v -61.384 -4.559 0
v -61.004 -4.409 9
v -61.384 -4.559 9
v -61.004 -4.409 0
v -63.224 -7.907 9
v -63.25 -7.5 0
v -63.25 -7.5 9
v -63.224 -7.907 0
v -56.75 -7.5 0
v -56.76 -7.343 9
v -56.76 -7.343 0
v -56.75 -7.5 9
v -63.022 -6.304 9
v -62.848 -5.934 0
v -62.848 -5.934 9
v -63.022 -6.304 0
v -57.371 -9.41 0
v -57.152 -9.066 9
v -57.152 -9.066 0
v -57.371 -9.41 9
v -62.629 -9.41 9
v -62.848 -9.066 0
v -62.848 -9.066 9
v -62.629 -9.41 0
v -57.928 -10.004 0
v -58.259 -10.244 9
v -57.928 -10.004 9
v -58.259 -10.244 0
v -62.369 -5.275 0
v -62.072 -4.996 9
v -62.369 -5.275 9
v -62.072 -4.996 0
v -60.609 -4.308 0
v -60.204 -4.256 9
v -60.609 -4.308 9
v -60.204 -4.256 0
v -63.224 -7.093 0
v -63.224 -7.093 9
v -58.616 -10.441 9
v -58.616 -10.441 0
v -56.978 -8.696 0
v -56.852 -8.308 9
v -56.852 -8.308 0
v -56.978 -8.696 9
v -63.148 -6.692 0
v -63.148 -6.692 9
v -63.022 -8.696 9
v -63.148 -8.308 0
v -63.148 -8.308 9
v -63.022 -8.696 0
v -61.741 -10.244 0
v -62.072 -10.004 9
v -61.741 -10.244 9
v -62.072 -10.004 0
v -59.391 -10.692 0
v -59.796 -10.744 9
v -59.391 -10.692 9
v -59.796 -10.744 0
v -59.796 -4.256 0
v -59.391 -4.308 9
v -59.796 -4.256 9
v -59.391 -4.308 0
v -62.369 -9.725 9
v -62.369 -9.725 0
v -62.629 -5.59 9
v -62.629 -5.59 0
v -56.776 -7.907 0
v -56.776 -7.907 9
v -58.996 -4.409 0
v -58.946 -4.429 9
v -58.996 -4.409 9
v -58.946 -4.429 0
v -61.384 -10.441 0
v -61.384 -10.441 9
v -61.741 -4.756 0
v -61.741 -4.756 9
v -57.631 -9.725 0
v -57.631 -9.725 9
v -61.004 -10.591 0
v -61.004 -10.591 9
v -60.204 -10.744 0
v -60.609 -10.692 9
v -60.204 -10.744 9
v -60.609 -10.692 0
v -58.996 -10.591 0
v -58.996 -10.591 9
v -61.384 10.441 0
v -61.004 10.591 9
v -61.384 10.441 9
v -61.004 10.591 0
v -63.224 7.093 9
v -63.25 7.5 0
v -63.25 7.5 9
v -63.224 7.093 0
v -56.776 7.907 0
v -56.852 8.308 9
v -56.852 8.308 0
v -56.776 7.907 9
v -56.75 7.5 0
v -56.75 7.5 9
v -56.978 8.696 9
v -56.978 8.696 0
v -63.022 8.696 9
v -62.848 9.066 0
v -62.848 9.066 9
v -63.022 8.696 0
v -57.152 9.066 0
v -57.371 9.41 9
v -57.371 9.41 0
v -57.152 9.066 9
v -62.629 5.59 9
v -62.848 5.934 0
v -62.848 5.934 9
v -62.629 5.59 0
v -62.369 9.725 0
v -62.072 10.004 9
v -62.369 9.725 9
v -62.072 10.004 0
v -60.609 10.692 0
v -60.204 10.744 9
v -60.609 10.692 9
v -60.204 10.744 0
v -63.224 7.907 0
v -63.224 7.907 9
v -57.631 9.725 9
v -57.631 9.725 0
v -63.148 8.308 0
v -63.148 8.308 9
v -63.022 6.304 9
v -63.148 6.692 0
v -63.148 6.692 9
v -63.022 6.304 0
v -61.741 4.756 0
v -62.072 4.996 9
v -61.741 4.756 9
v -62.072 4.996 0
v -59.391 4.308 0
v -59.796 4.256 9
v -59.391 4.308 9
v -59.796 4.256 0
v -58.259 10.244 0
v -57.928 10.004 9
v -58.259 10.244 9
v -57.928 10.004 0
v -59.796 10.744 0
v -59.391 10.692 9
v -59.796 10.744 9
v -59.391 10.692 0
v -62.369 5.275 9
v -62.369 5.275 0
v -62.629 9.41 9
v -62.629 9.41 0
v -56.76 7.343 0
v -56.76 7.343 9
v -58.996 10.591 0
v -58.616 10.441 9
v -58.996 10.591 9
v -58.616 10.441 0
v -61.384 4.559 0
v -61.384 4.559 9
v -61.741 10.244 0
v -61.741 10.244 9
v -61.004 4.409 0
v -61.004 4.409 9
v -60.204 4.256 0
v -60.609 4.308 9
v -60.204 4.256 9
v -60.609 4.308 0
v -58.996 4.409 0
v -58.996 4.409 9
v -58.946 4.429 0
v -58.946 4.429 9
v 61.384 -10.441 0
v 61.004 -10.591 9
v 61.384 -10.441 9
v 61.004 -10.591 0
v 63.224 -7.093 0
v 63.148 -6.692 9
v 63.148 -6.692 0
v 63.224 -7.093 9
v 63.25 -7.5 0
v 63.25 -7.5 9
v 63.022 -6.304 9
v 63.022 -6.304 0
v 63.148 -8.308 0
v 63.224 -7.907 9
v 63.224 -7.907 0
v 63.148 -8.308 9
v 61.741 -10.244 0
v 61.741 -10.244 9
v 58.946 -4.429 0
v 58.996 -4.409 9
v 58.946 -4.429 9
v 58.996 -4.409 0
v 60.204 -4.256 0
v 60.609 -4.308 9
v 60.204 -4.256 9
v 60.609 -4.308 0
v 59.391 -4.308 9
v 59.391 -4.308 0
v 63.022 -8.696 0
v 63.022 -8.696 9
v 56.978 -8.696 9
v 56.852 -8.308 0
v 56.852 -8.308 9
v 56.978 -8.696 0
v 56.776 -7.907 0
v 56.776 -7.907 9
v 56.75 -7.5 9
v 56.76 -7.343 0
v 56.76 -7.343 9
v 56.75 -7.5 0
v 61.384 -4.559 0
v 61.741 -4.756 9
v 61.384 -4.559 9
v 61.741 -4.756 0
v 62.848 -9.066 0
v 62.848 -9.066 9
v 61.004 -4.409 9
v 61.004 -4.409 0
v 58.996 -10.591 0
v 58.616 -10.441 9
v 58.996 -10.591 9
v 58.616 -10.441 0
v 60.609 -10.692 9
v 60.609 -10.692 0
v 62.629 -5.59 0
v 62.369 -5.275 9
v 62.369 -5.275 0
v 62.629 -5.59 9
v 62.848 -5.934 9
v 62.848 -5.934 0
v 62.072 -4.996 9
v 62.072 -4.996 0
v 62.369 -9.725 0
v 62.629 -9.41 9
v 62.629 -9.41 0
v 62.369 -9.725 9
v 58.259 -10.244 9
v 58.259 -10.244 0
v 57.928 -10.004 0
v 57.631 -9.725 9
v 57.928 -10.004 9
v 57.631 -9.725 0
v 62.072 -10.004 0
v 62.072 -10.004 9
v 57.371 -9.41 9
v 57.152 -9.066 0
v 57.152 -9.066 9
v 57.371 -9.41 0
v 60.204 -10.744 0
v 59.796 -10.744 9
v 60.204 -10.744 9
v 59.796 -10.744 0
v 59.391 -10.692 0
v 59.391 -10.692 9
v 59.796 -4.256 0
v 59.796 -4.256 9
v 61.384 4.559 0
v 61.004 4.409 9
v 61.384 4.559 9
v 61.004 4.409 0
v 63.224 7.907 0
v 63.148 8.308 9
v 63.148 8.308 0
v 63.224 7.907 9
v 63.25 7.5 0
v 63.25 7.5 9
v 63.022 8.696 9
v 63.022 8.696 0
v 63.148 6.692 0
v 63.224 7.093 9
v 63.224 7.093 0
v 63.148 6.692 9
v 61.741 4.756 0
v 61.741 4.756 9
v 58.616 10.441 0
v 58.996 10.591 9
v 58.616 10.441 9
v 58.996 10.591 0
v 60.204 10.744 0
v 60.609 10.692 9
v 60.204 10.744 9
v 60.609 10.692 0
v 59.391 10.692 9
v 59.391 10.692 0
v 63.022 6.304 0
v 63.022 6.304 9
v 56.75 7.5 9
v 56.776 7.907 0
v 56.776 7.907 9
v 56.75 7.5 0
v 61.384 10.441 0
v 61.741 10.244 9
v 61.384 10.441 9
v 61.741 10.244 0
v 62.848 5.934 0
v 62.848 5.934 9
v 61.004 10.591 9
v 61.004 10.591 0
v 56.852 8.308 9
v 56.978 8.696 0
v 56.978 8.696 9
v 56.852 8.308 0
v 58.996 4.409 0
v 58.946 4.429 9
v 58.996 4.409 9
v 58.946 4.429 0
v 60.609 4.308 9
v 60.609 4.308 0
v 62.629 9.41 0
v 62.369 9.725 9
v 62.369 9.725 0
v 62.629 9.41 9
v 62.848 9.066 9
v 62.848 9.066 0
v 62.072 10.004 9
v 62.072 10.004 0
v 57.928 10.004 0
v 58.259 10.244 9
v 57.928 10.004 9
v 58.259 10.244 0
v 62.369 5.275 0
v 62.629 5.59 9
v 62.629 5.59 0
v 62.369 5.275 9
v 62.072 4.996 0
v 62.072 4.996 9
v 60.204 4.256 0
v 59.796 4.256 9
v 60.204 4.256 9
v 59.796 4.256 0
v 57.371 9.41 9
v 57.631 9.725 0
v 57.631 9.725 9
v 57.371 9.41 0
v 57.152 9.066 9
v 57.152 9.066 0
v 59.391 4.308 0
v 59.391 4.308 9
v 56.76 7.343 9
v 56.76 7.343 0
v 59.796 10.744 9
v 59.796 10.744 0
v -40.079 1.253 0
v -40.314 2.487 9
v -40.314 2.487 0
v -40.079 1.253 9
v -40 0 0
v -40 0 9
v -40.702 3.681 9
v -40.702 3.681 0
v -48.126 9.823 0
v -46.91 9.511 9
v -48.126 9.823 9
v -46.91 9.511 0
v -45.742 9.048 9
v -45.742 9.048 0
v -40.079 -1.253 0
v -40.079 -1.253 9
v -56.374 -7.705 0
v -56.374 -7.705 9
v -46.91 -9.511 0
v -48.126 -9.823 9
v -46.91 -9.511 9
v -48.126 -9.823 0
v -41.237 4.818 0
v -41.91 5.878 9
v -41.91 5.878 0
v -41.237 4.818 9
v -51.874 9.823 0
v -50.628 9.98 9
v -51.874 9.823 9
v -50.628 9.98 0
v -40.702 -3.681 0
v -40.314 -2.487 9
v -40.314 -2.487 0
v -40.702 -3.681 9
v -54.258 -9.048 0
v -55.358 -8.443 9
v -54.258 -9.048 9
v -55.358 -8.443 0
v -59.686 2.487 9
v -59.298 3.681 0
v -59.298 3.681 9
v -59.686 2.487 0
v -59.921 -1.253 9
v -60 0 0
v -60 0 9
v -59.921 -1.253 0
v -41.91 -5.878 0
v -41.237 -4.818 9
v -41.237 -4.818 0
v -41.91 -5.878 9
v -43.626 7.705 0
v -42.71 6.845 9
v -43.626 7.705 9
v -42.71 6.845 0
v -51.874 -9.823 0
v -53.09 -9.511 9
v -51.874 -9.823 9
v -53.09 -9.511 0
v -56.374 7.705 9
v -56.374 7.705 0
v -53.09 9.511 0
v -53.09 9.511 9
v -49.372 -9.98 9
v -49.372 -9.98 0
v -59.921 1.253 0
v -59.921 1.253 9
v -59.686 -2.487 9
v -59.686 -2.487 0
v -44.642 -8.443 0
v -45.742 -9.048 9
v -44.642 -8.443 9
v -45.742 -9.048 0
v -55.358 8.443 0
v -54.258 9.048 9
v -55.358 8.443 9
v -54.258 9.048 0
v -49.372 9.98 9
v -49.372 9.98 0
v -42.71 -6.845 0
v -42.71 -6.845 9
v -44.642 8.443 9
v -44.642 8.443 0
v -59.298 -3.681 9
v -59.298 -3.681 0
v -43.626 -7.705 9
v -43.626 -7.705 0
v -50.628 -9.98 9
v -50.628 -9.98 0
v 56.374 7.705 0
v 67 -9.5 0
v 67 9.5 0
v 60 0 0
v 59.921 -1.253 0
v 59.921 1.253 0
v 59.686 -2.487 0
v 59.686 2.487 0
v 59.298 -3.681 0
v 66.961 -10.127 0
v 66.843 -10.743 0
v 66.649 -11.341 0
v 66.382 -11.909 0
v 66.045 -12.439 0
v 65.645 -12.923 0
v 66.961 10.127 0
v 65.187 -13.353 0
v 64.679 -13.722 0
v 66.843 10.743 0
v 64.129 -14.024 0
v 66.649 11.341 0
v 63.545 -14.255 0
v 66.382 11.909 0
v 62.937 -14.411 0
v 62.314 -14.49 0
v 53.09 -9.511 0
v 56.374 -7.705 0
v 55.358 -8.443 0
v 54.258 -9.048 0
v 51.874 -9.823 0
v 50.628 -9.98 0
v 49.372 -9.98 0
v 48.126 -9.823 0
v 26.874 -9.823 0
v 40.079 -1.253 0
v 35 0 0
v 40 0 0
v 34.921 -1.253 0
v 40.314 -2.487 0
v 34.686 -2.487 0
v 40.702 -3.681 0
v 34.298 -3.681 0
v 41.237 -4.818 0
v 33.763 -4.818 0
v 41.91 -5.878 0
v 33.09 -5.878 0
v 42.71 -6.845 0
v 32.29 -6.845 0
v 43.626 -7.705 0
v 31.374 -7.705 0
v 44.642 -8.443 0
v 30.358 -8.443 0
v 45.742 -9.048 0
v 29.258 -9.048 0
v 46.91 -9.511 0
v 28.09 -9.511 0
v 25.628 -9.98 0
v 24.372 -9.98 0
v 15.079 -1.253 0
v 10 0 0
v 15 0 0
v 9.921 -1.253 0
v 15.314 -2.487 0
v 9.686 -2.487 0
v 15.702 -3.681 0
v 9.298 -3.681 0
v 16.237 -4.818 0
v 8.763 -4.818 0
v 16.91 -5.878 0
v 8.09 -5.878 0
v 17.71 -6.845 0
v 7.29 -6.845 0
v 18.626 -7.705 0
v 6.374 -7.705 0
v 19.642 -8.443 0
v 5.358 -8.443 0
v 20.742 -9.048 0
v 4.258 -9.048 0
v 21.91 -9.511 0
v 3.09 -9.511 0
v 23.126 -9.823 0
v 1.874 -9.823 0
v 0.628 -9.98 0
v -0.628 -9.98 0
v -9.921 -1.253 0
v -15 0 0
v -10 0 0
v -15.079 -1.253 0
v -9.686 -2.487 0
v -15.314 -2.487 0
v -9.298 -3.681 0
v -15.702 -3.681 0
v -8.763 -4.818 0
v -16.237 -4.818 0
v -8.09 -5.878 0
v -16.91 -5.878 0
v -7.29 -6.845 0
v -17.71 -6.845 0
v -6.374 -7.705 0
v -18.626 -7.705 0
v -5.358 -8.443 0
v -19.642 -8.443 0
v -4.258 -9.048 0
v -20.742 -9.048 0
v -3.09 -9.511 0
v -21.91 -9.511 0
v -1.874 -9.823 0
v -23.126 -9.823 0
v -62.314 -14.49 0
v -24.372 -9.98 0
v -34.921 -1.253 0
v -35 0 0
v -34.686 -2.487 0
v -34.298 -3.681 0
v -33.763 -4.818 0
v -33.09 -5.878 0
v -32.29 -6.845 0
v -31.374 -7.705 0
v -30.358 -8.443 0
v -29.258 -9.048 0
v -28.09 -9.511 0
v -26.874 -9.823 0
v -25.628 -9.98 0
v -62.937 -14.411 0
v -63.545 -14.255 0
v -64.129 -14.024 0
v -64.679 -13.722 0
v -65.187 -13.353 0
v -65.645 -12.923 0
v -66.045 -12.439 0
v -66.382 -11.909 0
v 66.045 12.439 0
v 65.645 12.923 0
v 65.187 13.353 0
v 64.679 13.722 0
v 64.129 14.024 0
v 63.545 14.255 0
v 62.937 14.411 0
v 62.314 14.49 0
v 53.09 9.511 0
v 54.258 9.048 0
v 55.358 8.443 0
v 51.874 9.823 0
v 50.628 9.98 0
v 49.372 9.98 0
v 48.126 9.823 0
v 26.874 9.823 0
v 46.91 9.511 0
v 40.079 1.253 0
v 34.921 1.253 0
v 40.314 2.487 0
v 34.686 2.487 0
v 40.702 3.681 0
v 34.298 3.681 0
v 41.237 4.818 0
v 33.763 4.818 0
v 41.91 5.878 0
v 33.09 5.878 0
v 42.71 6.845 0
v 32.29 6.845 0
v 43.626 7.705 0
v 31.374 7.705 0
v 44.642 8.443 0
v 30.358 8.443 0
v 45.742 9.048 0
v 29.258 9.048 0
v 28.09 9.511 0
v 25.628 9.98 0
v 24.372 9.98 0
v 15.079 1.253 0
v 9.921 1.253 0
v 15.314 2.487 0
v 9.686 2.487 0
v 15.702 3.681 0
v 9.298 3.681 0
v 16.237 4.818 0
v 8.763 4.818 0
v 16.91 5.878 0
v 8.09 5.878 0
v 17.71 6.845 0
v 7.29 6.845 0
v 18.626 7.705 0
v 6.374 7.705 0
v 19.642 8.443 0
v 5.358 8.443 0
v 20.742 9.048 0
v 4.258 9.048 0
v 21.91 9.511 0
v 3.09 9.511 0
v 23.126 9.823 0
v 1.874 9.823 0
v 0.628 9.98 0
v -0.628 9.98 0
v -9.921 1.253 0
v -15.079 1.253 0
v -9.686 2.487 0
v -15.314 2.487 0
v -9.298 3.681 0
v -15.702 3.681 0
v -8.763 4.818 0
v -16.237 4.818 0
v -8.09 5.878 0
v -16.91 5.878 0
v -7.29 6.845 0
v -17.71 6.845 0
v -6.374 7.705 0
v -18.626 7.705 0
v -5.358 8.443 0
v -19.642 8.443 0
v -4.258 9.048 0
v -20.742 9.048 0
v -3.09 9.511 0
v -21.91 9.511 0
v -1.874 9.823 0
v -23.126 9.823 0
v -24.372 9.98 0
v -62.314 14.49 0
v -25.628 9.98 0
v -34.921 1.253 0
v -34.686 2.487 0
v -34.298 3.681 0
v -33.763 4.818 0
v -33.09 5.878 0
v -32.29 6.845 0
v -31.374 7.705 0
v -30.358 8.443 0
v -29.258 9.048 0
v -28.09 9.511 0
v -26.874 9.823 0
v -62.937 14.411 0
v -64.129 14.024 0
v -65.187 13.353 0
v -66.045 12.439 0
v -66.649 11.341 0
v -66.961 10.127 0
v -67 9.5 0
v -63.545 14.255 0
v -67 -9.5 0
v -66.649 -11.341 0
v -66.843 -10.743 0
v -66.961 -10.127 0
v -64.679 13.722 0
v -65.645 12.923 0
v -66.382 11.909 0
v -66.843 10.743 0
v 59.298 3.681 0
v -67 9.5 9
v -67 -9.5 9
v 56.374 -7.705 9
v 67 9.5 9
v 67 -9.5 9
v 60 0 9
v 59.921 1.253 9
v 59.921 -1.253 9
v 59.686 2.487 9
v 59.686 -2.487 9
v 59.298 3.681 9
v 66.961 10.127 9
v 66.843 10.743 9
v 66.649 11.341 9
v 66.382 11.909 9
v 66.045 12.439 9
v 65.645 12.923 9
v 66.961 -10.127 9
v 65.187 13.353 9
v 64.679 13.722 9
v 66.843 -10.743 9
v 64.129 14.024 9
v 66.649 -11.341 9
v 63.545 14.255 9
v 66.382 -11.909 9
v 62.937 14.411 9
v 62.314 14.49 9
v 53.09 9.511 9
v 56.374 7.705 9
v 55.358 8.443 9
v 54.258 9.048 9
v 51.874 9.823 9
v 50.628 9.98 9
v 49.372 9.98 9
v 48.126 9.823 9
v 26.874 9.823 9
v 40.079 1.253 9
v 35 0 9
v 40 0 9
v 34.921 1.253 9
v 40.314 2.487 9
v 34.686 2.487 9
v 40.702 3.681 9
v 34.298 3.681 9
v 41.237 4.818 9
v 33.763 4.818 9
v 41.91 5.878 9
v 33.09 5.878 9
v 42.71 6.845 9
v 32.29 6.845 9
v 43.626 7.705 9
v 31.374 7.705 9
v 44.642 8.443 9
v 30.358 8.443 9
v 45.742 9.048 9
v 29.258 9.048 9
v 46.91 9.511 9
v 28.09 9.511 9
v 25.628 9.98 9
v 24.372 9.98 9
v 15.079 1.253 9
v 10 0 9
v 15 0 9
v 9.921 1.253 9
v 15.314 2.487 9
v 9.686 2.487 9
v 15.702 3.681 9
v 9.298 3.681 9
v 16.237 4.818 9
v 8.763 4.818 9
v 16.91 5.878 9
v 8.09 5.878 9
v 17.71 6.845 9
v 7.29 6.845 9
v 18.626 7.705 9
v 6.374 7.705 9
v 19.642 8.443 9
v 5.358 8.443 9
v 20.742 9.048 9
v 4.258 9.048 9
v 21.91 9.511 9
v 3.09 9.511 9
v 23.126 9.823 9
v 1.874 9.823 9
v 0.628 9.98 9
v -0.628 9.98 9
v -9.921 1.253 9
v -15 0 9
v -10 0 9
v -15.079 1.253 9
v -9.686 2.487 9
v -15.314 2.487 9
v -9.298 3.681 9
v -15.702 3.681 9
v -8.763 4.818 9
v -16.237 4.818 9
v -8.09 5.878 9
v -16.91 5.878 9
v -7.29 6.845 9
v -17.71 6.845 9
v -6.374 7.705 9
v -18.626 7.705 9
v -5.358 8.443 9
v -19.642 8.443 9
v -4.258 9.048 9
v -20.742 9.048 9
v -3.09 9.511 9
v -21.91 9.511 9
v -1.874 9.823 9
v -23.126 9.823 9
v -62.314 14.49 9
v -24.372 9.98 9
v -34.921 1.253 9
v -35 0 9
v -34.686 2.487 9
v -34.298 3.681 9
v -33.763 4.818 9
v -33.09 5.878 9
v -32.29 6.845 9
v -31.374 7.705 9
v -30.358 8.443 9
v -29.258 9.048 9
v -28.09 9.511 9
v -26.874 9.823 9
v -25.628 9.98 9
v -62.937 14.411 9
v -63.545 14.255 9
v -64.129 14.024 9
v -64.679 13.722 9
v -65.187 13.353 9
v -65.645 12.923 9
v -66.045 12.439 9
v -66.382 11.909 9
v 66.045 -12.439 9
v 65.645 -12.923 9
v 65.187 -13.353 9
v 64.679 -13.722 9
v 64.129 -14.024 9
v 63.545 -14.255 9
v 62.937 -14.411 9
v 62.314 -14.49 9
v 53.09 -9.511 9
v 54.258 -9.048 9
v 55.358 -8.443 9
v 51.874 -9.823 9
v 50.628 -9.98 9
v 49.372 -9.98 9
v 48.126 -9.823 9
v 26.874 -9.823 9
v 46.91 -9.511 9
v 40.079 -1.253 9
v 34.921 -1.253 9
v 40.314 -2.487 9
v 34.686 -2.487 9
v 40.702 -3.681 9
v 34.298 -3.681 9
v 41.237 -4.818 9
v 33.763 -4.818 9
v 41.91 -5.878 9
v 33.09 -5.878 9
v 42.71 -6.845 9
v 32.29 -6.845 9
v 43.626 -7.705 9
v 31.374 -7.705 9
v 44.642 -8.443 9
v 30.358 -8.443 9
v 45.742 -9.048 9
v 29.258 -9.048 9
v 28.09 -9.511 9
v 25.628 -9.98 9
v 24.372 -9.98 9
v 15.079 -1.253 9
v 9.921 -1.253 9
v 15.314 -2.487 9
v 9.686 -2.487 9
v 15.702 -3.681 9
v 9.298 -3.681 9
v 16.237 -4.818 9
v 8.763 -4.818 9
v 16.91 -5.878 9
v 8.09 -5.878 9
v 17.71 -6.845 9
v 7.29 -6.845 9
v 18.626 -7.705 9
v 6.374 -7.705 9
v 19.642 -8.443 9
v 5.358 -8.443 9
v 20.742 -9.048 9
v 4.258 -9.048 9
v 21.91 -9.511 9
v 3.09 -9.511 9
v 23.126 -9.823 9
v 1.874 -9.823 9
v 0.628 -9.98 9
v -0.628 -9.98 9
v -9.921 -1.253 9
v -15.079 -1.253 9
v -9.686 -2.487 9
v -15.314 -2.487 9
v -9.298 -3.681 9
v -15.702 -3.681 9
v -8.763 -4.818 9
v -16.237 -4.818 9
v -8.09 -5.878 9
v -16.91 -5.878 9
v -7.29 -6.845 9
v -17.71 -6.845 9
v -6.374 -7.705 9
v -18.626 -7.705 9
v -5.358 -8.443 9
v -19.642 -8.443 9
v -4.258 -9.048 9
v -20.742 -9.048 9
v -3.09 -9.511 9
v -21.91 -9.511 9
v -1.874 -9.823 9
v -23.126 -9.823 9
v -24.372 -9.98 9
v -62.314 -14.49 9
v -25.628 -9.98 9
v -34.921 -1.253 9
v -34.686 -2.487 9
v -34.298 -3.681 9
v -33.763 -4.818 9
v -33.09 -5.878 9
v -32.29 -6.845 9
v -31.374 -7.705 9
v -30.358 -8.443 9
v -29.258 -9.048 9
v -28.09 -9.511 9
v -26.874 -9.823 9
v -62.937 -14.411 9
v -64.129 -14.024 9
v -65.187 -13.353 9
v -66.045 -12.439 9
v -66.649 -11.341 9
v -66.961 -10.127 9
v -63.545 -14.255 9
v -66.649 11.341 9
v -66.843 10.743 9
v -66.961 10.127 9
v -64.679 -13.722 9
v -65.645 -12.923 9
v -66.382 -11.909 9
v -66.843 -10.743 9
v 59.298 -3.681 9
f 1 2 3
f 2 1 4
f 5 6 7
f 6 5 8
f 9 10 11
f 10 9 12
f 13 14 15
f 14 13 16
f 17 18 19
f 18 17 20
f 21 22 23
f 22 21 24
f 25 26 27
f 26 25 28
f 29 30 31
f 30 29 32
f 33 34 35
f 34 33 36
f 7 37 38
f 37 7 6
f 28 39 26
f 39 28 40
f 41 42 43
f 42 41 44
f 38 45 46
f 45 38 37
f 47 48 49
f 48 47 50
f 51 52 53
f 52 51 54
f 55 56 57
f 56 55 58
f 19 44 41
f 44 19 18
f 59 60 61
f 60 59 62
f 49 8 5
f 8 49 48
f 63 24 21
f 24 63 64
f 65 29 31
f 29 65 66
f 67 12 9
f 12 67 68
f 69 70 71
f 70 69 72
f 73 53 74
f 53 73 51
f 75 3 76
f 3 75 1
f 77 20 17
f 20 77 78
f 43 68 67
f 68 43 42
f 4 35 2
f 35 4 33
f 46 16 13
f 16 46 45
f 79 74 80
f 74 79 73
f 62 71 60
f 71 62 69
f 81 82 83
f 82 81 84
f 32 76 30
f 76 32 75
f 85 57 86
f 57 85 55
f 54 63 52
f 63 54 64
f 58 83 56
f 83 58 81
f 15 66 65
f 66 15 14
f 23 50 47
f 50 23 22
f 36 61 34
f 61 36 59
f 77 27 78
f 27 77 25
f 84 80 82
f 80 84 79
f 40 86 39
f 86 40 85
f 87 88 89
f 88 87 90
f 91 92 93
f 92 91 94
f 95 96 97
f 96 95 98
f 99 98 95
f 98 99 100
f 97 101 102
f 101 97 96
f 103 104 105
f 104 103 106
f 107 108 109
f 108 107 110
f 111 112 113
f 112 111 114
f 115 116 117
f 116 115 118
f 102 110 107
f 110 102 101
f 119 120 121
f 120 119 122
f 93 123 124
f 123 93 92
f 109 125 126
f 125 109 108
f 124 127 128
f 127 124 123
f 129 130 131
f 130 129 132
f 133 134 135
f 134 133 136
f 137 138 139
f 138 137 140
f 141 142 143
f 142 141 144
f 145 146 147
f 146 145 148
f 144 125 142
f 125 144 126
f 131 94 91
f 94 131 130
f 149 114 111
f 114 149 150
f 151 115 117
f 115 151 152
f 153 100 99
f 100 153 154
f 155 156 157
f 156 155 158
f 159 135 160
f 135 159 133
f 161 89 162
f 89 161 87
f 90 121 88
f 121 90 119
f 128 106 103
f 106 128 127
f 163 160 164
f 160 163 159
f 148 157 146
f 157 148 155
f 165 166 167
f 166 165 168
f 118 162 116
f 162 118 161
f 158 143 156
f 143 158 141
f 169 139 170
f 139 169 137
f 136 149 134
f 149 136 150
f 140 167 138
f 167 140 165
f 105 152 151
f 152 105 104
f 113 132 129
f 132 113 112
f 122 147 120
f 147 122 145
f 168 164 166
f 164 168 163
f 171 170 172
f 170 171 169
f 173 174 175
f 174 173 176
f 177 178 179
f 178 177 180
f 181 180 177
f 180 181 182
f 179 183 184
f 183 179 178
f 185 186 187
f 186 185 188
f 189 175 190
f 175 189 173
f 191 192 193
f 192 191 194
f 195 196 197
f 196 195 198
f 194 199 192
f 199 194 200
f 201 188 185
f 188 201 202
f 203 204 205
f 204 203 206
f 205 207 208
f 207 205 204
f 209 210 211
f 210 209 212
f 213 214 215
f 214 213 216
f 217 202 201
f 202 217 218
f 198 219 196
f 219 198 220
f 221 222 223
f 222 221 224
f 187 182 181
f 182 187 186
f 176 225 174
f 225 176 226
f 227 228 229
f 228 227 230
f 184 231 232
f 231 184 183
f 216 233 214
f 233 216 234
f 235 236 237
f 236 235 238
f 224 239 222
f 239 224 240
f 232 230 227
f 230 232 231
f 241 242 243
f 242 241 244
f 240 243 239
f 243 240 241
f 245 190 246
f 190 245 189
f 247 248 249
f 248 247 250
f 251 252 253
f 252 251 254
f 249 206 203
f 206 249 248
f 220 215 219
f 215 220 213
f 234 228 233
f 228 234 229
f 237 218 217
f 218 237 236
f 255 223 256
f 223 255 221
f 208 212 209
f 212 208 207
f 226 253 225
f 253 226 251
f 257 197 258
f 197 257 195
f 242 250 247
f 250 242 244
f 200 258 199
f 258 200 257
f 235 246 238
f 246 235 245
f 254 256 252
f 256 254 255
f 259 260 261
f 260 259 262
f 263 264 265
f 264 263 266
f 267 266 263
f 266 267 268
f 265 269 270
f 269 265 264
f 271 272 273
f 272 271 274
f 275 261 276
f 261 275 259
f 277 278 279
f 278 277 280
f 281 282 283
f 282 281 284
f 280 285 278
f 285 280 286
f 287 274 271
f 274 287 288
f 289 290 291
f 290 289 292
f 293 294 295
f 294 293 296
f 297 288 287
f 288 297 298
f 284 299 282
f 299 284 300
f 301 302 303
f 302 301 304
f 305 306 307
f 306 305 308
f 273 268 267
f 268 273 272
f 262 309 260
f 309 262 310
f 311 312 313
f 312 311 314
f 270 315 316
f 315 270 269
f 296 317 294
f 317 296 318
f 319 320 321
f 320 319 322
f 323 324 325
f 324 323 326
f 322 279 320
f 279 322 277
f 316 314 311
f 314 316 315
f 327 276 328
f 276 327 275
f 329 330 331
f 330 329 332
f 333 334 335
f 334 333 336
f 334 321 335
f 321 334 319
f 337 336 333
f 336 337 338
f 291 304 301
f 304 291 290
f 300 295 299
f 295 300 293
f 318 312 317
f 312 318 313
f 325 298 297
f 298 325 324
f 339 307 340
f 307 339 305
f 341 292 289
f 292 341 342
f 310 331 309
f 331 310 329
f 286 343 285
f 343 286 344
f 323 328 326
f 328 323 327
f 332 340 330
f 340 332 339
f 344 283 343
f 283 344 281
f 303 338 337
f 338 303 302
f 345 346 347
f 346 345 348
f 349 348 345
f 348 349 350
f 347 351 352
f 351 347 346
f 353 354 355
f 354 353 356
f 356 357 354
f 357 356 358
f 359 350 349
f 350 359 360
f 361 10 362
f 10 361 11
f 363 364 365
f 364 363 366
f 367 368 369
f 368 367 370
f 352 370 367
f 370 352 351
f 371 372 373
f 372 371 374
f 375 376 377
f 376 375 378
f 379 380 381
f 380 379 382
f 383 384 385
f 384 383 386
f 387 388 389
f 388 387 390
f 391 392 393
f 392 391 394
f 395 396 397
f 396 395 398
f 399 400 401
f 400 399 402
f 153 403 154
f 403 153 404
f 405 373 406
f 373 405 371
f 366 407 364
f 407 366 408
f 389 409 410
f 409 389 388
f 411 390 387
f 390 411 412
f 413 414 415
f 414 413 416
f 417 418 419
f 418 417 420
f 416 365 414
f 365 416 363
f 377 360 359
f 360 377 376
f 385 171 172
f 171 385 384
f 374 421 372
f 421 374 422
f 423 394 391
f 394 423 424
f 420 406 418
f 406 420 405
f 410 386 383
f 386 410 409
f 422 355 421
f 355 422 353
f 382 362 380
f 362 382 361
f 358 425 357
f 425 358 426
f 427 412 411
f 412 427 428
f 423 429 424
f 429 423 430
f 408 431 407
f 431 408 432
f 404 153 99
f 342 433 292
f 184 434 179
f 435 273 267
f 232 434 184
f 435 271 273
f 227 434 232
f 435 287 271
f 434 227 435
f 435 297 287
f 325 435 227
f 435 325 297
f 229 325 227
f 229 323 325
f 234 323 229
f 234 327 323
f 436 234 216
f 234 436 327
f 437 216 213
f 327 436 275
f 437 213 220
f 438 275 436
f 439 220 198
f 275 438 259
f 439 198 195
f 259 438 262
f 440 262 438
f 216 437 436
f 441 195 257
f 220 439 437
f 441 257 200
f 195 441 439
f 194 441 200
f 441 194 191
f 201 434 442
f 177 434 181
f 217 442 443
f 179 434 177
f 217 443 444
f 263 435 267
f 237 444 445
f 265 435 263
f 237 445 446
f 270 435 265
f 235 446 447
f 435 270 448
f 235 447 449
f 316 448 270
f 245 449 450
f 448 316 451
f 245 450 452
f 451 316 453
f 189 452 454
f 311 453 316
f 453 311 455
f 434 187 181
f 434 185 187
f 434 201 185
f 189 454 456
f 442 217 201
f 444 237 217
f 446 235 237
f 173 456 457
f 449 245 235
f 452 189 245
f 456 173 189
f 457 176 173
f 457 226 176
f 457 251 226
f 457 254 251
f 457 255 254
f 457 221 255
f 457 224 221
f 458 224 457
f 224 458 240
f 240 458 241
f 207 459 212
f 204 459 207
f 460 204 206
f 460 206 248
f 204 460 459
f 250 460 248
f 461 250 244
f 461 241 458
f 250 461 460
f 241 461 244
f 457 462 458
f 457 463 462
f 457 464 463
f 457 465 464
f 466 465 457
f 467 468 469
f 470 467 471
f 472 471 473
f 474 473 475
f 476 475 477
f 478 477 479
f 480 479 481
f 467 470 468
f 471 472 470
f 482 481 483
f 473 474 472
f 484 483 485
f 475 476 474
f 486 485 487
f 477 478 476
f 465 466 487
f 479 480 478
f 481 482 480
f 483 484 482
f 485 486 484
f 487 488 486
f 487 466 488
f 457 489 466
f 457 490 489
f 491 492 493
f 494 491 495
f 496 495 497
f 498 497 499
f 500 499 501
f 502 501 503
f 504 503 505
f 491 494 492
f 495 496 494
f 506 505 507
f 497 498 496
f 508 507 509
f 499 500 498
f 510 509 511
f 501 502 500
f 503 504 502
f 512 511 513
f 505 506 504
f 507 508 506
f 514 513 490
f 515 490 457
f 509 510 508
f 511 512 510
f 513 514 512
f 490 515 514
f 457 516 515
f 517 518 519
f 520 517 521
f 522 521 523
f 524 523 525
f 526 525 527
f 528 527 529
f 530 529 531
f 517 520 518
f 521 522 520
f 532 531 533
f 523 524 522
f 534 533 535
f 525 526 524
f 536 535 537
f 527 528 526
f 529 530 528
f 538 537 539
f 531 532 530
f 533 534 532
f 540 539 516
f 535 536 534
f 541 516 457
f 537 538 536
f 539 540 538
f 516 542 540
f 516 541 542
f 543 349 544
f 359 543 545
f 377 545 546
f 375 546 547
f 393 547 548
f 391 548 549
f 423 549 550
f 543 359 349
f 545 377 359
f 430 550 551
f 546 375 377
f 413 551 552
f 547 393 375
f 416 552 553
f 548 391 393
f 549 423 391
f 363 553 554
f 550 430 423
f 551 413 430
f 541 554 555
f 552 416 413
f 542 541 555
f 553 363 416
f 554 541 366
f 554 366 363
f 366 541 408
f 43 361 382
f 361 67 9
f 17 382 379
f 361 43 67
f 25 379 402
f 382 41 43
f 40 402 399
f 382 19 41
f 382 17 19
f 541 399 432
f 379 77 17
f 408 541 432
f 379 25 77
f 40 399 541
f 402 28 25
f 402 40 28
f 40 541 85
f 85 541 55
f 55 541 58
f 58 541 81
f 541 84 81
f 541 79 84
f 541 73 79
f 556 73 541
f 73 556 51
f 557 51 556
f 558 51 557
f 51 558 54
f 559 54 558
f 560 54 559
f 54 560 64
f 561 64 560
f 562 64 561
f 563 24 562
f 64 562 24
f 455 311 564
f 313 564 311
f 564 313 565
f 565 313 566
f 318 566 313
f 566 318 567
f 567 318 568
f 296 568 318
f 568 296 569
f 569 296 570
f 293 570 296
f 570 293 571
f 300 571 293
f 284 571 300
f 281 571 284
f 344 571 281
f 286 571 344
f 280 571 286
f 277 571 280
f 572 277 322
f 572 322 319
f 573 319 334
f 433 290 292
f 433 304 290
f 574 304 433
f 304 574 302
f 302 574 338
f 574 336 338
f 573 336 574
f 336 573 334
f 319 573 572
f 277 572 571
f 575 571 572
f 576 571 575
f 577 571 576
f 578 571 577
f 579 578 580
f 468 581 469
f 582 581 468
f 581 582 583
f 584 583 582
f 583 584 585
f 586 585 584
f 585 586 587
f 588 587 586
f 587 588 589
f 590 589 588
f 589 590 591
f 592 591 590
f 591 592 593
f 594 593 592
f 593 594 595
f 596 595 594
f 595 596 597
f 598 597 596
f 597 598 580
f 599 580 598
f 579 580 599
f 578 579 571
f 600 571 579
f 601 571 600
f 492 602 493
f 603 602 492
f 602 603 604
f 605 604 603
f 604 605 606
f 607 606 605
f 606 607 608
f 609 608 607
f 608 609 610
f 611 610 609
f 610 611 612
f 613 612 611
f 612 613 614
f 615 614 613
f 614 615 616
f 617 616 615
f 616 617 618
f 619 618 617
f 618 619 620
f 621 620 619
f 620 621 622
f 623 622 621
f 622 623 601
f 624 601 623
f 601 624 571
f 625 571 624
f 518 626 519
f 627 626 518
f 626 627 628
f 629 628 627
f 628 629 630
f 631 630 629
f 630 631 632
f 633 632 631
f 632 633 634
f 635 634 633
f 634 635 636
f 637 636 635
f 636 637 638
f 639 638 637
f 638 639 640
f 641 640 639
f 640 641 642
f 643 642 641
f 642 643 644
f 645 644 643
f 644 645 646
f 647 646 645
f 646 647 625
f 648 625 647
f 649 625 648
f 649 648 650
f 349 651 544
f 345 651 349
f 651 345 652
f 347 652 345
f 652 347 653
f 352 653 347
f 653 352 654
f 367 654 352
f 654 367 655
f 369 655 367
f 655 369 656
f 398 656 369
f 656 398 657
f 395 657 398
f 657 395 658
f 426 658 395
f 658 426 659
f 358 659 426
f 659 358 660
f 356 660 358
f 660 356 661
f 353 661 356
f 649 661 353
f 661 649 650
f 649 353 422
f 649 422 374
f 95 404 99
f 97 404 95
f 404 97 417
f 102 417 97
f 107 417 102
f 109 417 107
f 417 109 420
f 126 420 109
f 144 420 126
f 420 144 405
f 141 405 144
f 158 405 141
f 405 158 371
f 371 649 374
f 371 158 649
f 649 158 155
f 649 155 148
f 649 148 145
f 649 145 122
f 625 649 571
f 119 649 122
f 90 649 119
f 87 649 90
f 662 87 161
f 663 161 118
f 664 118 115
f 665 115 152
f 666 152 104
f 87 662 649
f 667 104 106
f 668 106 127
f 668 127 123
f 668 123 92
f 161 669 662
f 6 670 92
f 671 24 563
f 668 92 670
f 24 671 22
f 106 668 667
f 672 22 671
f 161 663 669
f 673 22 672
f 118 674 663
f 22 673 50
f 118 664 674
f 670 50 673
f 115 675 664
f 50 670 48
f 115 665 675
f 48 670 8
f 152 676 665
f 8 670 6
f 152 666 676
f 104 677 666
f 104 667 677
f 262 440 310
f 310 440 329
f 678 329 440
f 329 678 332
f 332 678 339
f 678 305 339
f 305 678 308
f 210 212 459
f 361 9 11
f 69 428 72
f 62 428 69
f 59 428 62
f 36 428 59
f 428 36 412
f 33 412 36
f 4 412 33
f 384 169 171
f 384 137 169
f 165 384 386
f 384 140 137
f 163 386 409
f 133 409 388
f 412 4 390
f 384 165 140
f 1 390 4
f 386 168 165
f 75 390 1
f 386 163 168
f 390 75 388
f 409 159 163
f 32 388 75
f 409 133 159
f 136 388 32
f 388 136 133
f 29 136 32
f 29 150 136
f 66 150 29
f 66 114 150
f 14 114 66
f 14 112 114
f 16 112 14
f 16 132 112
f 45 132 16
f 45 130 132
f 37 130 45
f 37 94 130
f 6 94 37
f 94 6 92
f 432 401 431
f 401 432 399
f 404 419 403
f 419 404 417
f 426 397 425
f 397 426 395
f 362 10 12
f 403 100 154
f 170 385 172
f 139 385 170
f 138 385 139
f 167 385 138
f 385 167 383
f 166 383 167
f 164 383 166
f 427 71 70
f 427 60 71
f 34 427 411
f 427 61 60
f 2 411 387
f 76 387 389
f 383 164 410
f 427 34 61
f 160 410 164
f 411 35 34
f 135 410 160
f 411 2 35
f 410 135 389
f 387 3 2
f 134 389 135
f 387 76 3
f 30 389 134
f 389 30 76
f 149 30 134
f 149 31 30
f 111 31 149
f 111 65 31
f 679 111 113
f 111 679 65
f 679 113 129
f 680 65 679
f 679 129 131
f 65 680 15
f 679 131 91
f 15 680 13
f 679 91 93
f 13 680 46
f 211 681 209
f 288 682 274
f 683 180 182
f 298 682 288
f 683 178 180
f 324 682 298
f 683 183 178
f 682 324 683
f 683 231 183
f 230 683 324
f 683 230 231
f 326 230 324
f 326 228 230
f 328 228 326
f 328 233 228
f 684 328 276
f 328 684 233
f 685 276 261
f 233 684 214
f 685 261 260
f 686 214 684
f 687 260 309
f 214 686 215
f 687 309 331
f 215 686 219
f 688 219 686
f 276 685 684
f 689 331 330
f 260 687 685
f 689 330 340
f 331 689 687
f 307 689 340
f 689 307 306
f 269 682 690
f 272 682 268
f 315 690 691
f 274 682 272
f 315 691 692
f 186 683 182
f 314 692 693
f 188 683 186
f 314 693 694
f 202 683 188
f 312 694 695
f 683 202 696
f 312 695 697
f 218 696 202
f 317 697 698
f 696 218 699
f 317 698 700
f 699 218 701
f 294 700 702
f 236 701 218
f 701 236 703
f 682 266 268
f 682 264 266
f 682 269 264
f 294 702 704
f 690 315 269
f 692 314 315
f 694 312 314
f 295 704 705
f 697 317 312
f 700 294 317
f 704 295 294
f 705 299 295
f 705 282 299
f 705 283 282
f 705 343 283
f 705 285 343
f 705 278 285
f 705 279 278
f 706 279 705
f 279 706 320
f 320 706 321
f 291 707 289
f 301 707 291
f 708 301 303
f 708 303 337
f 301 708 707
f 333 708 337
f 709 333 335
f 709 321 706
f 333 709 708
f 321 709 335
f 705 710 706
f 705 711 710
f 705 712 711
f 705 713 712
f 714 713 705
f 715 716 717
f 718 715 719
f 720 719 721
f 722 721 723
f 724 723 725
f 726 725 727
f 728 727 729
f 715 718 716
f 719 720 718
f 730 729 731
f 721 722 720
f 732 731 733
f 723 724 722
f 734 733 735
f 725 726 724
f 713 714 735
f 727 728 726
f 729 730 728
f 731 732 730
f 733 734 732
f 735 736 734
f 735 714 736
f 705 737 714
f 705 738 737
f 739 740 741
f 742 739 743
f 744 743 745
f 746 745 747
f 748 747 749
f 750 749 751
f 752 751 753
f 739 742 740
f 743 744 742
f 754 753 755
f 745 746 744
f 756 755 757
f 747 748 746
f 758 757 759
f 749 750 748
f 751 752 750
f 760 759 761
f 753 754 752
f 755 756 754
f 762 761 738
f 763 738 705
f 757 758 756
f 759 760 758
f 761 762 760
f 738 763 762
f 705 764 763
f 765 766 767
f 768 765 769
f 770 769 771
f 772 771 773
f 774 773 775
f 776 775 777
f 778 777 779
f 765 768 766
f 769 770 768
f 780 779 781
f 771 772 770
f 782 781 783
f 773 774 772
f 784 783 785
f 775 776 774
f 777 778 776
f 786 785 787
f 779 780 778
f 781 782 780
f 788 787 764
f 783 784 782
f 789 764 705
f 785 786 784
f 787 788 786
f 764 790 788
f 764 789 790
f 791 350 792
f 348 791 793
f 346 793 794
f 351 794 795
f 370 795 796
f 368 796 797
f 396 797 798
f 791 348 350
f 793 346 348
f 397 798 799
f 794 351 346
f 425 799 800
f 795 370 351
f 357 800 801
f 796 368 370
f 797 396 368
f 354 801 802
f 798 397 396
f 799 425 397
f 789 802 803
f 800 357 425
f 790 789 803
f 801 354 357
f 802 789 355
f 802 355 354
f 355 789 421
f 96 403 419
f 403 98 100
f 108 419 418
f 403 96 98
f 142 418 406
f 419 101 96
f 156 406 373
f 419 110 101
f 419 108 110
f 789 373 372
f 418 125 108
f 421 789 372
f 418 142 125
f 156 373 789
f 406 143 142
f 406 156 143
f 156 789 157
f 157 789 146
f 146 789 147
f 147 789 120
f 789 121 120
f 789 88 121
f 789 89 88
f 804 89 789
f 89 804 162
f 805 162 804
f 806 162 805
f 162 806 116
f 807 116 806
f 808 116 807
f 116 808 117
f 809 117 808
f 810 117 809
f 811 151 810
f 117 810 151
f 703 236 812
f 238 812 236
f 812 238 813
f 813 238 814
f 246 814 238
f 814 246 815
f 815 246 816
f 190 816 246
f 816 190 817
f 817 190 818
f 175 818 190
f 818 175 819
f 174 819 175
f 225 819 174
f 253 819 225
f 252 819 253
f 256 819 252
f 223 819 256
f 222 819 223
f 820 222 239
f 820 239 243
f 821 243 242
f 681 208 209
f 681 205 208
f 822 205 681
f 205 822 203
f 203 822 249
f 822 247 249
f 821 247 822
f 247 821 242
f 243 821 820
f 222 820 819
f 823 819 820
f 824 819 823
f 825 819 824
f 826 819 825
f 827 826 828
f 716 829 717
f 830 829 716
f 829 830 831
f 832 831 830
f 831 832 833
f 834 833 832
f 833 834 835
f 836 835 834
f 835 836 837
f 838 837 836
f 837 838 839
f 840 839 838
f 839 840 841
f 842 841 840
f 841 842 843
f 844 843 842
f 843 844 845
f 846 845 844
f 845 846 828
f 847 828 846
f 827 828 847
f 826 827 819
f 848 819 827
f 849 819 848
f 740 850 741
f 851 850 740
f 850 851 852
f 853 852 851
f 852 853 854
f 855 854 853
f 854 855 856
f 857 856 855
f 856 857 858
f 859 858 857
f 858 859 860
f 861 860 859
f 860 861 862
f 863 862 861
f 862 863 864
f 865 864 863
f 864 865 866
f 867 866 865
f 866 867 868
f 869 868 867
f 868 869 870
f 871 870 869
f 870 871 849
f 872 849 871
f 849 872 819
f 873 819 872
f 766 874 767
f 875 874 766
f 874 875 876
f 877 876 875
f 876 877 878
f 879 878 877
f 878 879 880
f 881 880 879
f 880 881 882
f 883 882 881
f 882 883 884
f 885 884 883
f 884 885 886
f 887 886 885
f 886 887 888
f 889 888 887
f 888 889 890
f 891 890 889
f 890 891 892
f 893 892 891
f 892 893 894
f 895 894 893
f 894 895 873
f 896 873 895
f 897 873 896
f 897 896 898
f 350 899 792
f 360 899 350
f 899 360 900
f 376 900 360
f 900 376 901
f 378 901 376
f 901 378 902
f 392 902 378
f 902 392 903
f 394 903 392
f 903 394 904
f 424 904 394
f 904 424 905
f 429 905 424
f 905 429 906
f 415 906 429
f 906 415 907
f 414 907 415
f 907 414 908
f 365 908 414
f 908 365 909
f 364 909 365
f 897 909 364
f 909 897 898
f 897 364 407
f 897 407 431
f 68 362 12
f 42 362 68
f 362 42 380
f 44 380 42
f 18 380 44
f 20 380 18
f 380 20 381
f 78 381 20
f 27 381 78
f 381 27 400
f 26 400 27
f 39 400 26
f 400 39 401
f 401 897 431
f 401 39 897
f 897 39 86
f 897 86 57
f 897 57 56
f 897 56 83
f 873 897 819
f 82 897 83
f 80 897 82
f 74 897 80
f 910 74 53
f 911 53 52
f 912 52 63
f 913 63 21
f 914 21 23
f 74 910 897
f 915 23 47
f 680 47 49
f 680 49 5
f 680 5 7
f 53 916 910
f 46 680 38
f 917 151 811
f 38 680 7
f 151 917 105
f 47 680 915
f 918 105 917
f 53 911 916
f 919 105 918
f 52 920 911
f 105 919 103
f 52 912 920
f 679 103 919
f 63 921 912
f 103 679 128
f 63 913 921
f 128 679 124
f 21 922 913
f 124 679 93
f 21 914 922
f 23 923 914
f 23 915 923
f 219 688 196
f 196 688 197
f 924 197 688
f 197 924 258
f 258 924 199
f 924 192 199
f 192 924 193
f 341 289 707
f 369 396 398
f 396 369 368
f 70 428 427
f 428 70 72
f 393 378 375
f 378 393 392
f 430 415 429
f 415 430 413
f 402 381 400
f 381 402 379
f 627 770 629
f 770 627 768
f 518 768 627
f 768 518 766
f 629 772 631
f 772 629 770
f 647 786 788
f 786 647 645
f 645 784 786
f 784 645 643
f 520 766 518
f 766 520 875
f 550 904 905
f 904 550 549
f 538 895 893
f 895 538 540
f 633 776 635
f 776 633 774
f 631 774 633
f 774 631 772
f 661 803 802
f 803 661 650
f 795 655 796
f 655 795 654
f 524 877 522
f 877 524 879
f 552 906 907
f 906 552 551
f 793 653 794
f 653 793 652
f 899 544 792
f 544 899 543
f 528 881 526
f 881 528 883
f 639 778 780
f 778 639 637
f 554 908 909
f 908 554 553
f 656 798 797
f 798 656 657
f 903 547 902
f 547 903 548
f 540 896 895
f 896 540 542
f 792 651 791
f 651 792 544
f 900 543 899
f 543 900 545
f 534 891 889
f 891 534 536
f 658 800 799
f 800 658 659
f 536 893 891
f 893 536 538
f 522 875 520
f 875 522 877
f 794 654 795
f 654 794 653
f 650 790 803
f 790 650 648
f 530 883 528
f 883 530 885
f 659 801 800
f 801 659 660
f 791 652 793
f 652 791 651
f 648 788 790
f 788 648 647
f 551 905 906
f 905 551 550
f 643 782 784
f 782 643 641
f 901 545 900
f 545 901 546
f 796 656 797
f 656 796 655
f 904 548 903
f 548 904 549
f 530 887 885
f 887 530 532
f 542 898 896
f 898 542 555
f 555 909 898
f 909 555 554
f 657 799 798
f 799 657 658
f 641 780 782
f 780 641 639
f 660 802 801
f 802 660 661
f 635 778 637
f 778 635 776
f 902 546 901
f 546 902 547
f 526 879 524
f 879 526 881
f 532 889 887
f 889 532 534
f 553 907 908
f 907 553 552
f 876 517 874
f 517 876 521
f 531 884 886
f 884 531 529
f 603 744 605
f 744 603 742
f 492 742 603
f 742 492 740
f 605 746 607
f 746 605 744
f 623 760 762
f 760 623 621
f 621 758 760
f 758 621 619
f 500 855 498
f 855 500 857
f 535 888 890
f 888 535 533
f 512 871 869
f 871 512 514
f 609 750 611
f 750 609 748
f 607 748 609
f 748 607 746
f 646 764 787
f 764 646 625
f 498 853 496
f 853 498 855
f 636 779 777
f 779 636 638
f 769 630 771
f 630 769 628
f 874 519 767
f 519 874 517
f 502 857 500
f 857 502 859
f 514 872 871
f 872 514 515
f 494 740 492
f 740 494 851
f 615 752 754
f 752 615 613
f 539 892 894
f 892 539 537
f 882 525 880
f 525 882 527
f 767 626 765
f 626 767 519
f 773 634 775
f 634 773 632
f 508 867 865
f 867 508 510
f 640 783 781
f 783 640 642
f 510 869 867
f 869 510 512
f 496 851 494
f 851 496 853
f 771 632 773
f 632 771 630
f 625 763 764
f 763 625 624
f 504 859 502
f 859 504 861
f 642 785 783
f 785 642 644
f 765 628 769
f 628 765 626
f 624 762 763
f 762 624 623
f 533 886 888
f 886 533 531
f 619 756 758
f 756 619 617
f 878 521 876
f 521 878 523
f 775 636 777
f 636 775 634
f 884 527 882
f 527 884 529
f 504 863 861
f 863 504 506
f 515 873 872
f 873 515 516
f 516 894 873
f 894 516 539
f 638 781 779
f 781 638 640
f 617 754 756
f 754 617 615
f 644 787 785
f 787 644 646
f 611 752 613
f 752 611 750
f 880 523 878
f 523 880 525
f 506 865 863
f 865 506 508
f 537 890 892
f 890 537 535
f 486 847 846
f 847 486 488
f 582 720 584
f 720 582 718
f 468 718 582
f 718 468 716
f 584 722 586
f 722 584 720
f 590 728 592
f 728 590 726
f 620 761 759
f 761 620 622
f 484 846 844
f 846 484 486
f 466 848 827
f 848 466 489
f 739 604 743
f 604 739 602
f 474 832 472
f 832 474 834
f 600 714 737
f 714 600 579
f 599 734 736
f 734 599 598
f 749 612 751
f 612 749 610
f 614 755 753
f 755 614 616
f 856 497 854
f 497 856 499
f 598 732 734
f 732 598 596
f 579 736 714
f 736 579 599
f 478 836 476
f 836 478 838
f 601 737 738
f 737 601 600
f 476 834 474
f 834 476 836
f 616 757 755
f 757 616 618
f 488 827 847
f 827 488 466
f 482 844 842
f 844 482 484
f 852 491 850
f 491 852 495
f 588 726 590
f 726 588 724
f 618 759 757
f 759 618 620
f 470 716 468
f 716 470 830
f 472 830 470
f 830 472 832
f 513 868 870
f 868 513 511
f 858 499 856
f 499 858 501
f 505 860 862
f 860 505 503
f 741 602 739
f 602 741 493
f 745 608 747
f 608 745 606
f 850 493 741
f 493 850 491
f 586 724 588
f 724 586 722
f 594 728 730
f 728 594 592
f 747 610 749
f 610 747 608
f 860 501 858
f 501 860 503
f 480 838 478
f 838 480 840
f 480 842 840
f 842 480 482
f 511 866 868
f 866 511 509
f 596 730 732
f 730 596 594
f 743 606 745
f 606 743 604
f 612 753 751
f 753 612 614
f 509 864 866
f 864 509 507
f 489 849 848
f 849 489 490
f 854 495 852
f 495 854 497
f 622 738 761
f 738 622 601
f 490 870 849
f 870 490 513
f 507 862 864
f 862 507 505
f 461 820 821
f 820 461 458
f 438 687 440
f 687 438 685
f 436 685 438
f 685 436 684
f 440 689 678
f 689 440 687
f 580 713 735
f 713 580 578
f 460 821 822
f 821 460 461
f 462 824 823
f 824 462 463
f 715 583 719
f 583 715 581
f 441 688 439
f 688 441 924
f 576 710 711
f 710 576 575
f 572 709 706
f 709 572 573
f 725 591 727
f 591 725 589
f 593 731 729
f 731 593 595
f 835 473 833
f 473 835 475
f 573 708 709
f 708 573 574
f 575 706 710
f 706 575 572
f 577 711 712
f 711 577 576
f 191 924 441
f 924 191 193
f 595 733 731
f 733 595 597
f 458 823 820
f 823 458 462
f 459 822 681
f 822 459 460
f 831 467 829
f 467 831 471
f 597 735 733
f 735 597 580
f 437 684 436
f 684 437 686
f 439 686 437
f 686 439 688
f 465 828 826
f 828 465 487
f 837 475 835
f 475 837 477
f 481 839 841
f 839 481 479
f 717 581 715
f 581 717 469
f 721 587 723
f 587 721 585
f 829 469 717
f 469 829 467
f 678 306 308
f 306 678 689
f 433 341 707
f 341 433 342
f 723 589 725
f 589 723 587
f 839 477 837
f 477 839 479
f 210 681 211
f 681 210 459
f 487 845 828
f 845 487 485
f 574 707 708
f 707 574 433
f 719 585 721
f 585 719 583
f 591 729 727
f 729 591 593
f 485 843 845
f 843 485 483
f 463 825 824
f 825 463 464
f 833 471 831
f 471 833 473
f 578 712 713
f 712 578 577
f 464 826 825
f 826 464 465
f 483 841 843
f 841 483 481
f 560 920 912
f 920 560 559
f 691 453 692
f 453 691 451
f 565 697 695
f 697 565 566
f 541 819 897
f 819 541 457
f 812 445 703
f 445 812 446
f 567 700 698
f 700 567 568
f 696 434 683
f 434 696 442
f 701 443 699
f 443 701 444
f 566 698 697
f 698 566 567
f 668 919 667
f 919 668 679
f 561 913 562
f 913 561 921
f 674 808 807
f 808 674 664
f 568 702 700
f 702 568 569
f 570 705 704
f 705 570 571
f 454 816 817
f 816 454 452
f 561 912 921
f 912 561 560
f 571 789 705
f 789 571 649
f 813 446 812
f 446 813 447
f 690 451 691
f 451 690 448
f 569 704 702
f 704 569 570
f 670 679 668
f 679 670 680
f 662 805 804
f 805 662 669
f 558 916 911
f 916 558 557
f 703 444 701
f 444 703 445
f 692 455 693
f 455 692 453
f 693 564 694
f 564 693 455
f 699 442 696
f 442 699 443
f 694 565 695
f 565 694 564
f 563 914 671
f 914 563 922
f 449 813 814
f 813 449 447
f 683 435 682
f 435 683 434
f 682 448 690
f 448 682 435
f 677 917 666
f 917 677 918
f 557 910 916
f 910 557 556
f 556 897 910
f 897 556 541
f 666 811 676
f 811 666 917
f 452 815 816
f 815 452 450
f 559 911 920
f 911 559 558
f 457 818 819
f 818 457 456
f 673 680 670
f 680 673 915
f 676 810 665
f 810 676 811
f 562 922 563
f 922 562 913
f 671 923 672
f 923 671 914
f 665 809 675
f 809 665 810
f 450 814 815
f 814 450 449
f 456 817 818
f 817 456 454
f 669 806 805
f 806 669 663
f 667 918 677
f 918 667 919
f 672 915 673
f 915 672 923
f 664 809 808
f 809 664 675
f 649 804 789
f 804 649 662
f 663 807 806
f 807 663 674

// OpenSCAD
$fn = 50;


difference() {
	union() {
		hull() {
			translate(v = [-62.0000000000, 9.5000000000, 0]) {
				cylinder(h = 9, r = 5);
			}
			translate(v = [62.0000000000, 9.5000000000, 0]) {
				cylinder(h = 9, r = 5);
			}
			translate(v = [-62.0000000000, -9.5000000000, 0]) {
				cylinder(h = 9, r = 5);
			}
			translate(v = [62.0000000000, -9.5000000000, 0]) {
				cylinder(h = 9, r = 5);
			}
		}
	}
	union() {
		#translate(v = [-60.0000000000, -7.5000000000, -100.0000000000]) {
			cylinder(h = 200, r = 3.2500000000);
		}
		#translate(v = [-60.0000000000, 7.5000000000, -100.0000000000]) {
			cylinder(h = 200, r = 3.2500000000);
		}
		#translate(v = [60.0000000000, -7.5000000000, -100.0000000000]) {
			cylinder(h = 200, r = 3.2500000000);
		}
		#translate(v = [60.0000000000, 7.5000000000, -100.0000000000]) {
			cylinder(h = 200, r = 3.2500000000);
		}
		#translate(v = [-50.0000000000, 0, 0]) {
			cylinder(h = 9, r = 10.0000000000);
		}
		#translate(v = [-25.0000000000, 0, 0]) {
			cylinder(h = 9, r = 10.0000000000);
		}
		#cylinder(h = 9, r = 10.0000000000);
		#translate(v = [25.0000000000, 0, 0]) {
			cylinder(h = 9, r = 10.0000000000);
		}
		#translate(v = [50.0000000000, 0, 0]) {
			cylinder(h = 9, r = 10.0000000000);
		}
	}
}
